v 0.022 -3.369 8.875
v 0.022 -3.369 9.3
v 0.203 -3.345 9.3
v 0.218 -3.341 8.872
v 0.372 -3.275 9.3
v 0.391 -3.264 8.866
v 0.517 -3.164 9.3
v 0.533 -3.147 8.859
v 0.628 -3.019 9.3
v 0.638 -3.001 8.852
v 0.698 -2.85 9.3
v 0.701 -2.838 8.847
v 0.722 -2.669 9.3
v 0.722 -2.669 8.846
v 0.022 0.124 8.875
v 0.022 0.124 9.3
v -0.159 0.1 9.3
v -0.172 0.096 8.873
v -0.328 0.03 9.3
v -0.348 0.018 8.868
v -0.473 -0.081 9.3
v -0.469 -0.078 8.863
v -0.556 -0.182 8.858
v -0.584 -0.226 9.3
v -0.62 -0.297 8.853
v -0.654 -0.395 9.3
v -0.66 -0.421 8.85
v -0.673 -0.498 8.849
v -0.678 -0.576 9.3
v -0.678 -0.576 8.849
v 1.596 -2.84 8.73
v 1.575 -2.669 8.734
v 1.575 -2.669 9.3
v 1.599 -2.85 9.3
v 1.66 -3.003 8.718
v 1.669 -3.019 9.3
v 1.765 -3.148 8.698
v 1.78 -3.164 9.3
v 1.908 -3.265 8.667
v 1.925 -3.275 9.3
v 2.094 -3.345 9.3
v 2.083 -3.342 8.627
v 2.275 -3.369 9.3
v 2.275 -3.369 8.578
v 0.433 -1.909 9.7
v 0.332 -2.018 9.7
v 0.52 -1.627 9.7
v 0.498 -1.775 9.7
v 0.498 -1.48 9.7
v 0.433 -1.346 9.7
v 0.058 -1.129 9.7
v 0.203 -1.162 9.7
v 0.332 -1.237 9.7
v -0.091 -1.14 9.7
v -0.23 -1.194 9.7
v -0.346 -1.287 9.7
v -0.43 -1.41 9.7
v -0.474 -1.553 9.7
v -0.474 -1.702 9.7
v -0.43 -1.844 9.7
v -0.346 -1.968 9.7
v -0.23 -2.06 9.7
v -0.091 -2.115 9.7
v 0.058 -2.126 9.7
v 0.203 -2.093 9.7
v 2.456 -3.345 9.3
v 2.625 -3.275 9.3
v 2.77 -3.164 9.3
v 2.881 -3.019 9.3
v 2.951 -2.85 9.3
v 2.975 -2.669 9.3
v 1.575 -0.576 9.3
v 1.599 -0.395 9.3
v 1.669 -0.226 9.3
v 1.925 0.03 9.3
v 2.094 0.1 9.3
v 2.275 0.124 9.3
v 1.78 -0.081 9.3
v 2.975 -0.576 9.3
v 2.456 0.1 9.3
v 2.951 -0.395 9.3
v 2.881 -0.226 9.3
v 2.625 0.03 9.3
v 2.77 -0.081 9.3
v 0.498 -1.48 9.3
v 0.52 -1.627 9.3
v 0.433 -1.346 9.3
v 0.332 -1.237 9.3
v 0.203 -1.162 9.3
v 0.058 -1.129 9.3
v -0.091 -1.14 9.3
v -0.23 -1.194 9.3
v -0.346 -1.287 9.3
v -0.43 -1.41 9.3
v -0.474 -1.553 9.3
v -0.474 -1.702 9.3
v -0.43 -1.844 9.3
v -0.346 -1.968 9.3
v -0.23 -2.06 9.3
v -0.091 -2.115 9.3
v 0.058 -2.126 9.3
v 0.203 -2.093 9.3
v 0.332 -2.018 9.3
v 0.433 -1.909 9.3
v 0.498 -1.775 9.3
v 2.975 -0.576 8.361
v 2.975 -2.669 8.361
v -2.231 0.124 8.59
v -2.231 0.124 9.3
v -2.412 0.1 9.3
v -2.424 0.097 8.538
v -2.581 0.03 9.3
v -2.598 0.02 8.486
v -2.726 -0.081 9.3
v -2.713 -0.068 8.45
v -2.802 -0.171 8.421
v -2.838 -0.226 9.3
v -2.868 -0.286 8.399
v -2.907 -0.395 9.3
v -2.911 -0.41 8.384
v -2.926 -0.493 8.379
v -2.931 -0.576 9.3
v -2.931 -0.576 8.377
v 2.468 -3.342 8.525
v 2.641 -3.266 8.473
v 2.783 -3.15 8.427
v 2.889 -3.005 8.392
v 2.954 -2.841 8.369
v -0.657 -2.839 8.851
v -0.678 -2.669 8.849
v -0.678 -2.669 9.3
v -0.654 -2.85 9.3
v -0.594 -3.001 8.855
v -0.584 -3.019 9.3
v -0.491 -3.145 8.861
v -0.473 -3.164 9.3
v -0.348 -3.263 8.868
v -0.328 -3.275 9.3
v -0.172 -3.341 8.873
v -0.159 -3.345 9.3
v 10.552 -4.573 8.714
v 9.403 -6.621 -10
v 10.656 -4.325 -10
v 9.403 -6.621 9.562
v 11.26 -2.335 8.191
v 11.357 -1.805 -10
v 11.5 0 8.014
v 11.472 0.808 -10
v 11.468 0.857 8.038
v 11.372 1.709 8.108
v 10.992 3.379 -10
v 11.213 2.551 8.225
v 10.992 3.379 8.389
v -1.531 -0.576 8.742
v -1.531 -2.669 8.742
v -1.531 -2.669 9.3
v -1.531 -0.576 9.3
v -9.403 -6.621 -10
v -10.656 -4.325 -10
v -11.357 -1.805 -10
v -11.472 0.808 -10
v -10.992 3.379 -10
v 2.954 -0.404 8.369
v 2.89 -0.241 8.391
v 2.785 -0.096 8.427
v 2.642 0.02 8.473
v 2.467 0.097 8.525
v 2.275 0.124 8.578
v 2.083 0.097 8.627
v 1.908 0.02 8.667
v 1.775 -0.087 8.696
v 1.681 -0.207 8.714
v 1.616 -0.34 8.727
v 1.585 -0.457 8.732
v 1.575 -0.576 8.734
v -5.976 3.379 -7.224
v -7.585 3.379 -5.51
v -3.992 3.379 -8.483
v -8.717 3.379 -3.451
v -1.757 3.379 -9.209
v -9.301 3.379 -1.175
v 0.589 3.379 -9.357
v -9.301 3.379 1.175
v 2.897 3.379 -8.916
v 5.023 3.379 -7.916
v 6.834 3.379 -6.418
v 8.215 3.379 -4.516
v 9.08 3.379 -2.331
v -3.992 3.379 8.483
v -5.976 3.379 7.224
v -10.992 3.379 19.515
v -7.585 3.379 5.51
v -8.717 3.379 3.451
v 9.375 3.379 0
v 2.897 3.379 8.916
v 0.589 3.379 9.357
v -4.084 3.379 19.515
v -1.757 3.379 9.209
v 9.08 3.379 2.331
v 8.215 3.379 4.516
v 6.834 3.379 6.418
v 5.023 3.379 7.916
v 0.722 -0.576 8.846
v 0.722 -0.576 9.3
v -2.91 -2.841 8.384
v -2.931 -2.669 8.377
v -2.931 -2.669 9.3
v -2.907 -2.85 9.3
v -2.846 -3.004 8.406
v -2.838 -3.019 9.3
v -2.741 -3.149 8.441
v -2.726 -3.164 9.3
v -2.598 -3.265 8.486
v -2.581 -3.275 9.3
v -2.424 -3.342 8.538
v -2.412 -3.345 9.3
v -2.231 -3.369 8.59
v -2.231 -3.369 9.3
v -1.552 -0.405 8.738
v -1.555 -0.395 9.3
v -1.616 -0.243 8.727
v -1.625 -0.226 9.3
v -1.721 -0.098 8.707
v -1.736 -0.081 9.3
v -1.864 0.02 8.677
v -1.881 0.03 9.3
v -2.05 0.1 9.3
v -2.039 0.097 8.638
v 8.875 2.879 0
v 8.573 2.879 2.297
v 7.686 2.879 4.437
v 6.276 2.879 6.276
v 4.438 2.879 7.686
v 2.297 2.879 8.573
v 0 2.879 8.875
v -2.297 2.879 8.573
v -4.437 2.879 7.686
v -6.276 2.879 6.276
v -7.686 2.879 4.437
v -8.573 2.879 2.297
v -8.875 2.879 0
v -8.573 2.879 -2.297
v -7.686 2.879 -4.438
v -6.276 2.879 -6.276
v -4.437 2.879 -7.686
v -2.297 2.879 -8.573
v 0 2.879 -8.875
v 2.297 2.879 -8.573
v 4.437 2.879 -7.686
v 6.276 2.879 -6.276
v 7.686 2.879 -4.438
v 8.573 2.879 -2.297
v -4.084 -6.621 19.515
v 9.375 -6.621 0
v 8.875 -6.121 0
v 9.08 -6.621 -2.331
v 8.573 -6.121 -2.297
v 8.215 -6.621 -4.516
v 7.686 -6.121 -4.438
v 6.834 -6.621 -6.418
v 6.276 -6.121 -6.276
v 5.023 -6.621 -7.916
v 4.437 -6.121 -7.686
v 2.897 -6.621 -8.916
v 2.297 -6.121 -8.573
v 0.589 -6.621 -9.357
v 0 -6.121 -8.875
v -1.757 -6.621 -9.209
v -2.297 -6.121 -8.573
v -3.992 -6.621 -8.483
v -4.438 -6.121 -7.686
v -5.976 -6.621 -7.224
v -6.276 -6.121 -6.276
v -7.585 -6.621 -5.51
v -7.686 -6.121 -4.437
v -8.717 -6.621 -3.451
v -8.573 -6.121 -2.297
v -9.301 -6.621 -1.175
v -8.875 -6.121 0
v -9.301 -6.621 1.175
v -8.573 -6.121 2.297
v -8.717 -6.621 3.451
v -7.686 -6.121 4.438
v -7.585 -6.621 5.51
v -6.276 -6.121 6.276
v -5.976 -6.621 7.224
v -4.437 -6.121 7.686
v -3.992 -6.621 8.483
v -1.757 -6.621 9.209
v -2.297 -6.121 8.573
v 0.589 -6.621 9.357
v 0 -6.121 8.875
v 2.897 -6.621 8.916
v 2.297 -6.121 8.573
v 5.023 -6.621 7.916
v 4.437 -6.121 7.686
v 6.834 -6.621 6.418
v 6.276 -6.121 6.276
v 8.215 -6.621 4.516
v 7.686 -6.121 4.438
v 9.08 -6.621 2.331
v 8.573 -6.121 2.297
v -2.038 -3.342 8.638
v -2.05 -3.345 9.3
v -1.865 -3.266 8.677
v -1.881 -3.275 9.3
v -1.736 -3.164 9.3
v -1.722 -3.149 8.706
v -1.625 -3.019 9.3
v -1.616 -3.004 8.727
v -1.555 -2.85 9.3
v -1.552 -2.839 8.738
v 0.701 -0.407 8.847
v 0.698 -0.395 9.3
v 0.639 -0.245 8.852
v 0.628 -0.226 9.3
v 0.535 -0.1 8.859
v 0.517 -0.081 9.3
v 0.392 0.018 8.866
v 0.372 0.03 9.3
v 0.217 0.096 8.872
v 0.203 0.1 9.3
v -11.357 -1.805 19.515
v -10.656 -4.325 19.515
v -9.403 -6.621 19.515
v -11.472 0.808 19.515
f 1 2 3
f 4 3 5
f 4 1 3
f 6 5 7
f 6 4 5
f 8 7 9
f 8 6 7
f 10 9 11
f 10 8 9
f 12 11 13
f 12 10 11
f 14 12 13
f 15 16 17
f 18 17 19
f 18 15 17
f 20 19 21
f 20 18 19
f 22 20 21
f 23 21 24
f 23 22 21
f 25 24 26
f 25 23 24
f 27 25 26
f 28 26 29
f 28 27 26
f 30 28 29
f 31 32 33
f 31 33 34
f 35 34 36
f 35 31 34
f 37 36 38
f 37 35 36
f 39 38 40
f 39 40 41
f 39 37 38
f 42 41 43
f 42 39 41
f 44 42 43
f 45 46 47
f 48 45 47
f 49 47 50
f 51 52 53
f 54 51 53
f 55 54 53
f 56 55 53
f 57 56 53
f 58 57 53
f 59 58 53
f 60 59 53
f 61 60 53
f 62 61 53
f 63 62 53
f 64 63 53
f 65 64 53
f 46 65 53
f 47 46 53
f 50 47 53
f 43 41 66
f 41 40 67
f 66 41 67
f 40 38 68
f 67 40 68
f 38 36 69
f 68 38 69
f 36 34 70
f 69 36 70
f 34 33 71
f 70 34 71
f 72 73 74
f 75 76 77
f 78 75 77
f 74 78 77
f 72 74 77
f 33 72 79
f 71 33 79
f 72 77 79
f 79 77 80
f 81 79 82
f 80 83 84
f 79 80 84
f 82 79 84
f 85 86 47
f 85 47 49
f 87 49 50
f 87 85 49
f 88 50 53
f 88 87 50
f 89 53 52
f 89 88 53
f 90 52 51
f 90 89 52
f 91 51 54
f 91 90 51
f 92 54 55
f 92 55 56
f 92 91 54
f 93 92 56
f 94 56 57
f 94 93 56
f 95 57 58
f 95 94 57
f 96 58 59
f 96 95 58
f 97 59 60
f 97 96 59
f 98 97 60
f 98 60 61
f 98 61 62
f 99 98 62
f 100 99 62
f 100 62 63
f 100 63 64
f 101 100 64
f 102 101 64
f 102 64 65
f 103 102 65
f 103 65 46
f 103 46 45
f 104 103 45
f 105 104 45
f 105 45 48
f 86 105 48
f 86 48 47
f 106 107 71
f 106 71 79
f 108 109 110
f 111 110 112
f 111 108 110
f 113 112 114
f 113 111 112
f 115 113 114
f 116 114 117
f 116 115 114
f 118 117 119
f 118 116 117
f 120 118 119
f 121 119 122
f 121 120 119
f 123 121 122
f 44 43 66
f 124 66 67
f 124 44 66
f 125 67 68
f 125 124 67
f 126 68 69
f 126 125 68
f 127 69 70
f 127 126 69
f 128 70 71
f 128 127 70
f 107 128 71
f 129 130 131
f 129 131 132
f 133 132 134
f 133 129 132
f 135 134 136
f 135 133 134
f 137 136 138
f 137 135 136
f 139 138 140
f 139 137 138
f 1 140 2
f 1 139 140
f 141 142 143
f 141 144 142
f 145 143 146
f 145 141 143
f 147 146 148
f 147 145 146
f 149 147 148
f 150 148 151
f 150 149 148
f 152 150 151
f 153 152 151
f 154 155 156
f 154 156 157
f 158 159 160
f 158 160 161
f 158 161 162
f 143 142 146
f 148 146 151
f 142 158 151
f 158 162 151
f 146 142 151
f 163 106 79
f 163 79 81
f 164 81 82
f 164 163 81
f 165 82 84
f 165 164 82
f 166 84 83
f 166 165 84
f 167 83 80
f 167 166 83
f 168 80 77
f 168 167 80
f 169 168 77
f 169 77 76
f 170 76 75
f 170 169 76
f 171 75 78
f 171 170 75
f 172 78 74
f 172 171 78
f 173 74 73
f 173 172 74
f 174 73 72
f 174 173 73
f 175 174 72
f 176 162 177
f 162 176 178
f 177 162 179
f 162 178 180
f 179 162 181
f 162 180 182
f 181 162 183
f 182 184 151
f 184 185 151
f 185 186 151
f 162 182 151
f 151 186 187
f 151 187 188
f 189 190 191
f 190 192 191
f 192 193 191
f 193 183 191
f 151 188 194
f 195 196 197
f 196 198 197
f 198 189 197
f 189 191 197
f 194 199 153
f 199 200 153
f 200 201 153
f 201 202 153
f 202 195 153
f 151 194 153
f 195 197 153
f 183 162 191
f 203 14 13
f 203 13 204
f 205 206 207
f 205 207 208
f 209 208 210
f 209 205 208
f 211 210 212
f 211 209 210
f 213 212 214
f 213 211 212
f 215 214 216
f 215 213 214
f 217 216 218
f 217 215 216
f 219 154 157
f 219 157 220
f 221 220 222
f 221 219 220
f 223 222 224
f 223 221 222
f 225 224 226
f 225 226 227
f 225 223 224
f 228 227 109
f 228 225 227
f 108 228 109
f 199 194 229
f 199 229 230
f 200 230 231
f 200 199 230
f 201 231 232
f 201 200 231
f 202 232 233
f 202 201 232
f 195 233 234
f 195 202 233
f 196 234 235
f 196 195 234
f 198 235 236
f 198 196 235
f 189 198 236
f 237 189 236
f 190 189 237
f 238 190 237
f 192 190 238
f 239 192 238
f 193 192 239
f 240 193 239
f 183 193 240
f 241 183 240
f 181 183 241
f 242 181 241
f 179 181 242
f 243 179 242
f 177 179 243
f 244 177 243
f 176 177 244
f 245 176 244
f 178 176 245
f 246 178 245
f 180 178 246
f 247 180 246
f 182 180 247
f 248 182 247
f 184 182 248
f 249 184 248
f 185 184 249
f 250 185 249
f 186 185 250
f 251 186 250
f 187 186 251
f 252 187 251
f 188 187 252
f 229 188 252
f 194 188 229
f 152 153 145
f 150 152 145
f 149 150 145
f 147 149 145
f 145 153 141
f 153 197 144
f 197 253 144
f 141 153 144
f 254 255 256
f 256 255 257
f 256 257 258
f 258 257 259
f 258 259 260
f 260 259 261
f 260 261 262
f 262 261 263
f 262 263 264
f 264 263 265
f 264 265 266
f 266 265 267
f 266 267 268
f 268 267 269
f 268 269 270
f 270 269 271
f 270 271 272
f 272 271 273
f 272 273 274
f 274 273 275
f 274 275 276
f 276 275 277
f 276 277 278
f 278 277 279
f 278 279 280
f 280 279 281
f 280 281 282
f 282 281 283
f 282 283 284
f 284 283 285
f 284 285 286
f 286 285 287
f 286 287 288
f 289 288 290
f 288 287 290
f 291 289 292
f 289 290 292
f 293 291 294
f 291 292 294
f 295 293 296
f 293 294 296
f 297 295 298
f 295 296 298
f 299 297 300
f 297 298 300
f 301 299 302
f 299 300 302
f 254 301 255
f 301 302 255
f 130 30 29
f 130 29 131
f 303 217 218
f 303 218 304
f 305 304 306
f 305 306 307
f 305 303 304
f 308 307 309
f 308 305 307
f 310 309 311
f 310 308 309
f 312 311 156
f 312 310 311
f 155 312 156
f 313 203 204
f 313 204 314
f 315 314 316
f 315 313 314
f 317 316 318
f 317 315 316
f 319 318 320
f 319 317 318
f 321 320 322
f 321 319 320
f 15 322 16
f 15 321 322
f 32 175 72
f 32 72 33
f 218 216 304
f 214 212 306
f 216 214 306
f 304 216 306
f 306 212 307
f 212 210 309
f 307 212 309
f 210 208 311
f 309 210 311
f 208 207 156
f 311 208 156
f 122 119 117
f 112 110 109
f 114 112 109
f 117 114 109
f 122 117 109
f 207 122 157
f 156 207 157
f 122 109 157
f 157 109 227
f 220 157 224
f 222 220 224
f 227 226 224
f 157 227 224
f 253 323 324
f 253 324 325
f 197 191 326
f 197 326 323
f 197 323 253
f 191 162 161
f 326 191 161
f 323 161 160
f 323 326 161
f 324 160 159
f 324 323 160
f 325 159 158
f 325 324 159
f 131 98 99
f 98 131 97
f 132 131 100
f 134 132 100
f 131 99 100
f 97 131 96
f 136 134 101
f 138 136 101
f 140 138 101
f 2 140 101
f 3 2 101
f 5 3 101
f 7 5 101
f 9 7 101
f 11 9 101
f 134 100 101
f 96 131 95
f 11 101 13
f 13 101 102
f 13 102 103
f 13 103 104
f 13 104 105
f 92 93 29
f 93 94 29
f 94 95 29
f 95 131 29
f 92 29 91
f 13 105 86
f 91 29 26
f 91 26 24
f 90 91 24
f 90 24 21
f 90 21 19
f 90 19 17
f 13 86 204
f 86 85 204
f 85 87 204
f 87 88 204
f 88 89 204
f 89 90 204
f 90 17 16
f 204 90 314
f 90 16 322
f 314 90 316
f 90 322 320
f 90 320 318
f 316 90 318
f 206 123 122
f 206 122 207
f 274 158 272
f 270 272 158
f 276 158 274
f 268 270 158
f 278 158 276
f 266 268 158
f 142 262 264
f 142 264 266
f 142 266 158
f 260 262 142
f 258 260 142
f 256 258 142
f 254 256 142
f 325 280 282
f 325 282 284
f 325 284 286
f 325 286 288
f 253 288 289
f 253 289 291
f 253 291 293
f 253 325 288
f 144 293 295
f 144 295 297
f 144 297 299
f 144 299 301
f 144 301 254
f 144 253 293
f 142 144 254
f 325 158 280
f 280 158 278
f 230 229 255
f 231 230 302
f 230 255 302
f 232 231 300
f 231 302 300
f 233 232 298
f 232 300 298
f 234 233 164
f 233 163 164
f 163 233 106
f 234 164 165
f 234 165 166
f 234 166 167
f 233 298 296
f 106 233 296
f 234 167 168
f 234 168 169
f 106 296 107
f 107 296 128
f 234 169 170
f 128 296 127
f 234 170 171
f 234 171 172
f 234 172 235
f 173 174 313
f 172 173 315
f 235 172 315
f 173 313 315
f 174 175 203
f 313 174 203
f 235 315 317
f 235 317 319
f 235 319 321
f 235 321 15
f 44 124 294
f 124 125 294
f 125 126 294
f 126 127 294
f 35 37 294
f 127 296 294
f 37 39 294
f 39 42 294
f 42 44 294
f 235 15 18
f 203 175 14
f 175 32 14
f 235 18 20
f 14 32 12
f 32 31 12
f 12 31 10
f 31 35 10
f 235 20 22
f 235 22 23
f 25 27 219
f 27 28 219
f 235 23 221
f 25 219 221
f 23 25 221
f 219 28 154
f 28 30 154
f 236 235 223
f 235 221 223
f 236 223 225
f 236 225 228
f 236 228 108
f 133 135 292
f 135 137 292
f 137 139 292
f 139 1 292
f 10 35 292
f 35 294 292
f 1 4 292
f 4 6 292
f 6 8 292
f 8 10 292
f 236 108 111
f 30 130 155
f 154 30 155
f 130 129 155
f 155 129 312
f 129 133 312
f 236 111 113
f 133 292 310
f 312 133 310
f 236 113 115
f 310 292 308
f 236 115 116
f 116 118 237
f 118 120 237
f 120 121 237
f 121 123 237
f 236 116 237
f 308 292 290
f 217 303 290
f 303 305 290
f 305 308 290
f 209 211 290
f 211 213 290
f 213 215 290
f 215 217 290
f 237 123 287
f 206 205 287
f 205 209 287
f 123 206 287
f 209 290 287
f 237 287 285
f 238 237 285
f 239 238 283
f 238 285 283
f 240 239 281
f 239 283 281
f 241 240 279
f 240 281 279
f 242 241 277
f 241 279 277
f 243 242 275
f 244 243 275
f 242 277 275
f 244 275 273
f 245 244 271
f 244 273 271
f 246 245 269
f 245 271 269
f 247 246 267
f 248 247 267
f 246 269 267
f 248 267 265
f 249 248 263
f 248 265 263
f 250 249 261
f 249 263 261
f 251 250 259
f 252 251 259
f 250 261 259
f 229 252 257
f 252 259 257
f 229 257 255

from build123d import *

# Parameters (mm, degrees)
F1_R          = 11.5
F2_DEPTH      = 19.51505
F2_DEPTH_BACK = 10
F0_R          = 8.875
F3_DEPTH      = 25
F3_DEPTH_BACK = 25
F5_DEPTH      = 25
F5_DEPTH_BACK = 25
F6_W          = 31.0526300933
F6_H          = 13.8705706969
F6_H_2        = 13.1759493425
F7_DEPTH      = 25
F7_DEPTH_BACK = 25
F8_SIZE       = 0.5
F9_R          = 0.5
F10_DEPTH     = 9.3
F11_DEPTH     = 9.7


with BuildPart() as f2:
    # F1 (on Top) → F2 (new body, two sides)
    with BuildSketch(Plane.XY) as f2_sk:
        Circle(F1_R)
    extrude(amount=F2_DEPTH)
    extrude(f2_sk.sketch, amount=-F2_DEPTH_BACK)

    # F0 (on Front) → F3 (cut, two sides)
    with BuildSketch(Plane.XZ) as f3_sk:
        Circle(F0_R)
    extrude(amount=-F3_DEPTH, mode=Mode.SUBTRACT)
    extrude(f3_sk.sketch, amount=F3_DEPTH_BACK, mode=Mode.SUBTRACT)

    # F4 (on Front) → F5 (cut, two sides)
    with BuildSketch(Plane.XZ) as f5_sk:
        Polygon((24.7668549418, 28.5545103252), (-16.3316316903, 28.5545103252), (24.7668549418, -1.7773286672), align=None)
    extrude(amount=-F5_DEPTH, mode=Mode.SUBTRACT)
    extrude(f5_sk.sketch, amount=F5_DEPTH_BACK, mode=Mode.SUBTRACT)

    # F6 (on Top) → F7 (cut, two sides)
    with BuildSketch(Plane.XY) as f7_sk:
        with Locations((1.910218969, 10.3145037405)):
            Rectangle(F6_W, F6_H)
        with Locations((1.910218969, -13.2087562792)):
            Rectangle(F6_W, F6_H_2)
    extrude(amount=-F7_DEPTH, mode=Mode.SUBTRACT)
    extrude(f7_sk.sketch, amount=F7_DEPTH_BACK, mode=Mode.SUBTRACT)

    # F8
    f8_edges = [f2.edges().sort_by_distance(p)[0] for p in [
        (-8.875, 3.379218, 0),
        (-8.875, -6.620782, 0),
    ]]
    chamfer(f8_edges, length=F8_SIZE)

    # F9 (on Top) → F10 (cut)
    with BuildSketch(Plane.XY):
        with BuildLine():
            ThreePointArc((-2.2312842775, 0.1235368601), (-2.7262590243, -0.081488393), (-2.9312842775, -0.5764631399))
            Line((-2.9312842775, -0.5764631399), (-2.9312842775, -2.6688878175))
            ThreePointArc((-2.9312842775, -2.6688878175), (-2.7262590243, -3.1638625643), (-2.2312842775, -3.3688878175))
            ThreePointArc((-2.2312842775, -3.3688878175), (-1.7363095307, -3.1638625643), (-1.5312842775, -2.6688878175))
            Line((-1.5312842775, -2.6688878175), (-1.5312842775, -0.5764631399))
            ThreePointArc((-1.5312842775, -0.5764631399), (-1.7363095307, -0.081488393), (-2.2312842775, 0.1235368601))
        make_face()
        with BuildLine():
            ThreePointArc((0.0221650116, 0.1235368601), (-0.4728097352, -0.081488393), (-0.6778349884, -0.5764631399))
            Line((-0.6778349884, -0.5764631399), (-0.6778349884, -2.6688878175))
            ThreePointArc((-0.6778349884, -2.6688878175), (-0.4728097352, -3.1638625643), (0.0221650116, -3.3688878175))
            ThreePointArc((0.0221650116, -3.3688878175), (0.5171397584, -3.1638625643), (0.7221650116, -2.6688878175))
            Line((0.7221650116, -2.6688878175), (0.7221650116, -0.5764631399))
            ThreePointArc((0.7221650116, -0.5764631399), (0.5171397584, -0.081488393), (0.0221650116, 0.1235368601))
        make_face()
        with Locations((0.0201533299, -1.6274178245)):
            Circle(F9_R, mode=Mode.SUBTRACT)
        with BuildLine():
            ThreePointArc((2.2751650116, 0.1235368601), (1.7801902648, -0.081488393), (1.5751650116, -0.5764631399))
            Line((1.5751650116, -0.5764631399), (1.5751650116, -2.6688878175))
            ThreePointArc((1.5751650116, -2.6688878175), (1.7801902648, -3.1638625643), (2.2751650116, -3.3688878175))
            ThreePointArc((2.2751650116, -3.3688878175), (2.7701397584, -3.1638625643), (2.9751650116, -2.6688878175))
            Line((2.9751650116, -2.6688878175), (2.9751650116, -0.5764631399))
            ThreePointArc((2.9751650116, -0.5764631399), (2.7701397584, -0.081488393), (2.2751650116, 0.1235368601))
        make_face()
    extrude(amount=F10_DEPTH, mode=Mode.SUBTRACT)

    # F9 (on Top) → F11 (cut)
    with BuildSketch(Plane.XY):
        with Locations((0.0201533299, -1.6274178245)):
            Circle(F9_R)
    extrude(amount=F11_DEPTH, mode=Mode.SUBTRACT)


solid = f2.part
